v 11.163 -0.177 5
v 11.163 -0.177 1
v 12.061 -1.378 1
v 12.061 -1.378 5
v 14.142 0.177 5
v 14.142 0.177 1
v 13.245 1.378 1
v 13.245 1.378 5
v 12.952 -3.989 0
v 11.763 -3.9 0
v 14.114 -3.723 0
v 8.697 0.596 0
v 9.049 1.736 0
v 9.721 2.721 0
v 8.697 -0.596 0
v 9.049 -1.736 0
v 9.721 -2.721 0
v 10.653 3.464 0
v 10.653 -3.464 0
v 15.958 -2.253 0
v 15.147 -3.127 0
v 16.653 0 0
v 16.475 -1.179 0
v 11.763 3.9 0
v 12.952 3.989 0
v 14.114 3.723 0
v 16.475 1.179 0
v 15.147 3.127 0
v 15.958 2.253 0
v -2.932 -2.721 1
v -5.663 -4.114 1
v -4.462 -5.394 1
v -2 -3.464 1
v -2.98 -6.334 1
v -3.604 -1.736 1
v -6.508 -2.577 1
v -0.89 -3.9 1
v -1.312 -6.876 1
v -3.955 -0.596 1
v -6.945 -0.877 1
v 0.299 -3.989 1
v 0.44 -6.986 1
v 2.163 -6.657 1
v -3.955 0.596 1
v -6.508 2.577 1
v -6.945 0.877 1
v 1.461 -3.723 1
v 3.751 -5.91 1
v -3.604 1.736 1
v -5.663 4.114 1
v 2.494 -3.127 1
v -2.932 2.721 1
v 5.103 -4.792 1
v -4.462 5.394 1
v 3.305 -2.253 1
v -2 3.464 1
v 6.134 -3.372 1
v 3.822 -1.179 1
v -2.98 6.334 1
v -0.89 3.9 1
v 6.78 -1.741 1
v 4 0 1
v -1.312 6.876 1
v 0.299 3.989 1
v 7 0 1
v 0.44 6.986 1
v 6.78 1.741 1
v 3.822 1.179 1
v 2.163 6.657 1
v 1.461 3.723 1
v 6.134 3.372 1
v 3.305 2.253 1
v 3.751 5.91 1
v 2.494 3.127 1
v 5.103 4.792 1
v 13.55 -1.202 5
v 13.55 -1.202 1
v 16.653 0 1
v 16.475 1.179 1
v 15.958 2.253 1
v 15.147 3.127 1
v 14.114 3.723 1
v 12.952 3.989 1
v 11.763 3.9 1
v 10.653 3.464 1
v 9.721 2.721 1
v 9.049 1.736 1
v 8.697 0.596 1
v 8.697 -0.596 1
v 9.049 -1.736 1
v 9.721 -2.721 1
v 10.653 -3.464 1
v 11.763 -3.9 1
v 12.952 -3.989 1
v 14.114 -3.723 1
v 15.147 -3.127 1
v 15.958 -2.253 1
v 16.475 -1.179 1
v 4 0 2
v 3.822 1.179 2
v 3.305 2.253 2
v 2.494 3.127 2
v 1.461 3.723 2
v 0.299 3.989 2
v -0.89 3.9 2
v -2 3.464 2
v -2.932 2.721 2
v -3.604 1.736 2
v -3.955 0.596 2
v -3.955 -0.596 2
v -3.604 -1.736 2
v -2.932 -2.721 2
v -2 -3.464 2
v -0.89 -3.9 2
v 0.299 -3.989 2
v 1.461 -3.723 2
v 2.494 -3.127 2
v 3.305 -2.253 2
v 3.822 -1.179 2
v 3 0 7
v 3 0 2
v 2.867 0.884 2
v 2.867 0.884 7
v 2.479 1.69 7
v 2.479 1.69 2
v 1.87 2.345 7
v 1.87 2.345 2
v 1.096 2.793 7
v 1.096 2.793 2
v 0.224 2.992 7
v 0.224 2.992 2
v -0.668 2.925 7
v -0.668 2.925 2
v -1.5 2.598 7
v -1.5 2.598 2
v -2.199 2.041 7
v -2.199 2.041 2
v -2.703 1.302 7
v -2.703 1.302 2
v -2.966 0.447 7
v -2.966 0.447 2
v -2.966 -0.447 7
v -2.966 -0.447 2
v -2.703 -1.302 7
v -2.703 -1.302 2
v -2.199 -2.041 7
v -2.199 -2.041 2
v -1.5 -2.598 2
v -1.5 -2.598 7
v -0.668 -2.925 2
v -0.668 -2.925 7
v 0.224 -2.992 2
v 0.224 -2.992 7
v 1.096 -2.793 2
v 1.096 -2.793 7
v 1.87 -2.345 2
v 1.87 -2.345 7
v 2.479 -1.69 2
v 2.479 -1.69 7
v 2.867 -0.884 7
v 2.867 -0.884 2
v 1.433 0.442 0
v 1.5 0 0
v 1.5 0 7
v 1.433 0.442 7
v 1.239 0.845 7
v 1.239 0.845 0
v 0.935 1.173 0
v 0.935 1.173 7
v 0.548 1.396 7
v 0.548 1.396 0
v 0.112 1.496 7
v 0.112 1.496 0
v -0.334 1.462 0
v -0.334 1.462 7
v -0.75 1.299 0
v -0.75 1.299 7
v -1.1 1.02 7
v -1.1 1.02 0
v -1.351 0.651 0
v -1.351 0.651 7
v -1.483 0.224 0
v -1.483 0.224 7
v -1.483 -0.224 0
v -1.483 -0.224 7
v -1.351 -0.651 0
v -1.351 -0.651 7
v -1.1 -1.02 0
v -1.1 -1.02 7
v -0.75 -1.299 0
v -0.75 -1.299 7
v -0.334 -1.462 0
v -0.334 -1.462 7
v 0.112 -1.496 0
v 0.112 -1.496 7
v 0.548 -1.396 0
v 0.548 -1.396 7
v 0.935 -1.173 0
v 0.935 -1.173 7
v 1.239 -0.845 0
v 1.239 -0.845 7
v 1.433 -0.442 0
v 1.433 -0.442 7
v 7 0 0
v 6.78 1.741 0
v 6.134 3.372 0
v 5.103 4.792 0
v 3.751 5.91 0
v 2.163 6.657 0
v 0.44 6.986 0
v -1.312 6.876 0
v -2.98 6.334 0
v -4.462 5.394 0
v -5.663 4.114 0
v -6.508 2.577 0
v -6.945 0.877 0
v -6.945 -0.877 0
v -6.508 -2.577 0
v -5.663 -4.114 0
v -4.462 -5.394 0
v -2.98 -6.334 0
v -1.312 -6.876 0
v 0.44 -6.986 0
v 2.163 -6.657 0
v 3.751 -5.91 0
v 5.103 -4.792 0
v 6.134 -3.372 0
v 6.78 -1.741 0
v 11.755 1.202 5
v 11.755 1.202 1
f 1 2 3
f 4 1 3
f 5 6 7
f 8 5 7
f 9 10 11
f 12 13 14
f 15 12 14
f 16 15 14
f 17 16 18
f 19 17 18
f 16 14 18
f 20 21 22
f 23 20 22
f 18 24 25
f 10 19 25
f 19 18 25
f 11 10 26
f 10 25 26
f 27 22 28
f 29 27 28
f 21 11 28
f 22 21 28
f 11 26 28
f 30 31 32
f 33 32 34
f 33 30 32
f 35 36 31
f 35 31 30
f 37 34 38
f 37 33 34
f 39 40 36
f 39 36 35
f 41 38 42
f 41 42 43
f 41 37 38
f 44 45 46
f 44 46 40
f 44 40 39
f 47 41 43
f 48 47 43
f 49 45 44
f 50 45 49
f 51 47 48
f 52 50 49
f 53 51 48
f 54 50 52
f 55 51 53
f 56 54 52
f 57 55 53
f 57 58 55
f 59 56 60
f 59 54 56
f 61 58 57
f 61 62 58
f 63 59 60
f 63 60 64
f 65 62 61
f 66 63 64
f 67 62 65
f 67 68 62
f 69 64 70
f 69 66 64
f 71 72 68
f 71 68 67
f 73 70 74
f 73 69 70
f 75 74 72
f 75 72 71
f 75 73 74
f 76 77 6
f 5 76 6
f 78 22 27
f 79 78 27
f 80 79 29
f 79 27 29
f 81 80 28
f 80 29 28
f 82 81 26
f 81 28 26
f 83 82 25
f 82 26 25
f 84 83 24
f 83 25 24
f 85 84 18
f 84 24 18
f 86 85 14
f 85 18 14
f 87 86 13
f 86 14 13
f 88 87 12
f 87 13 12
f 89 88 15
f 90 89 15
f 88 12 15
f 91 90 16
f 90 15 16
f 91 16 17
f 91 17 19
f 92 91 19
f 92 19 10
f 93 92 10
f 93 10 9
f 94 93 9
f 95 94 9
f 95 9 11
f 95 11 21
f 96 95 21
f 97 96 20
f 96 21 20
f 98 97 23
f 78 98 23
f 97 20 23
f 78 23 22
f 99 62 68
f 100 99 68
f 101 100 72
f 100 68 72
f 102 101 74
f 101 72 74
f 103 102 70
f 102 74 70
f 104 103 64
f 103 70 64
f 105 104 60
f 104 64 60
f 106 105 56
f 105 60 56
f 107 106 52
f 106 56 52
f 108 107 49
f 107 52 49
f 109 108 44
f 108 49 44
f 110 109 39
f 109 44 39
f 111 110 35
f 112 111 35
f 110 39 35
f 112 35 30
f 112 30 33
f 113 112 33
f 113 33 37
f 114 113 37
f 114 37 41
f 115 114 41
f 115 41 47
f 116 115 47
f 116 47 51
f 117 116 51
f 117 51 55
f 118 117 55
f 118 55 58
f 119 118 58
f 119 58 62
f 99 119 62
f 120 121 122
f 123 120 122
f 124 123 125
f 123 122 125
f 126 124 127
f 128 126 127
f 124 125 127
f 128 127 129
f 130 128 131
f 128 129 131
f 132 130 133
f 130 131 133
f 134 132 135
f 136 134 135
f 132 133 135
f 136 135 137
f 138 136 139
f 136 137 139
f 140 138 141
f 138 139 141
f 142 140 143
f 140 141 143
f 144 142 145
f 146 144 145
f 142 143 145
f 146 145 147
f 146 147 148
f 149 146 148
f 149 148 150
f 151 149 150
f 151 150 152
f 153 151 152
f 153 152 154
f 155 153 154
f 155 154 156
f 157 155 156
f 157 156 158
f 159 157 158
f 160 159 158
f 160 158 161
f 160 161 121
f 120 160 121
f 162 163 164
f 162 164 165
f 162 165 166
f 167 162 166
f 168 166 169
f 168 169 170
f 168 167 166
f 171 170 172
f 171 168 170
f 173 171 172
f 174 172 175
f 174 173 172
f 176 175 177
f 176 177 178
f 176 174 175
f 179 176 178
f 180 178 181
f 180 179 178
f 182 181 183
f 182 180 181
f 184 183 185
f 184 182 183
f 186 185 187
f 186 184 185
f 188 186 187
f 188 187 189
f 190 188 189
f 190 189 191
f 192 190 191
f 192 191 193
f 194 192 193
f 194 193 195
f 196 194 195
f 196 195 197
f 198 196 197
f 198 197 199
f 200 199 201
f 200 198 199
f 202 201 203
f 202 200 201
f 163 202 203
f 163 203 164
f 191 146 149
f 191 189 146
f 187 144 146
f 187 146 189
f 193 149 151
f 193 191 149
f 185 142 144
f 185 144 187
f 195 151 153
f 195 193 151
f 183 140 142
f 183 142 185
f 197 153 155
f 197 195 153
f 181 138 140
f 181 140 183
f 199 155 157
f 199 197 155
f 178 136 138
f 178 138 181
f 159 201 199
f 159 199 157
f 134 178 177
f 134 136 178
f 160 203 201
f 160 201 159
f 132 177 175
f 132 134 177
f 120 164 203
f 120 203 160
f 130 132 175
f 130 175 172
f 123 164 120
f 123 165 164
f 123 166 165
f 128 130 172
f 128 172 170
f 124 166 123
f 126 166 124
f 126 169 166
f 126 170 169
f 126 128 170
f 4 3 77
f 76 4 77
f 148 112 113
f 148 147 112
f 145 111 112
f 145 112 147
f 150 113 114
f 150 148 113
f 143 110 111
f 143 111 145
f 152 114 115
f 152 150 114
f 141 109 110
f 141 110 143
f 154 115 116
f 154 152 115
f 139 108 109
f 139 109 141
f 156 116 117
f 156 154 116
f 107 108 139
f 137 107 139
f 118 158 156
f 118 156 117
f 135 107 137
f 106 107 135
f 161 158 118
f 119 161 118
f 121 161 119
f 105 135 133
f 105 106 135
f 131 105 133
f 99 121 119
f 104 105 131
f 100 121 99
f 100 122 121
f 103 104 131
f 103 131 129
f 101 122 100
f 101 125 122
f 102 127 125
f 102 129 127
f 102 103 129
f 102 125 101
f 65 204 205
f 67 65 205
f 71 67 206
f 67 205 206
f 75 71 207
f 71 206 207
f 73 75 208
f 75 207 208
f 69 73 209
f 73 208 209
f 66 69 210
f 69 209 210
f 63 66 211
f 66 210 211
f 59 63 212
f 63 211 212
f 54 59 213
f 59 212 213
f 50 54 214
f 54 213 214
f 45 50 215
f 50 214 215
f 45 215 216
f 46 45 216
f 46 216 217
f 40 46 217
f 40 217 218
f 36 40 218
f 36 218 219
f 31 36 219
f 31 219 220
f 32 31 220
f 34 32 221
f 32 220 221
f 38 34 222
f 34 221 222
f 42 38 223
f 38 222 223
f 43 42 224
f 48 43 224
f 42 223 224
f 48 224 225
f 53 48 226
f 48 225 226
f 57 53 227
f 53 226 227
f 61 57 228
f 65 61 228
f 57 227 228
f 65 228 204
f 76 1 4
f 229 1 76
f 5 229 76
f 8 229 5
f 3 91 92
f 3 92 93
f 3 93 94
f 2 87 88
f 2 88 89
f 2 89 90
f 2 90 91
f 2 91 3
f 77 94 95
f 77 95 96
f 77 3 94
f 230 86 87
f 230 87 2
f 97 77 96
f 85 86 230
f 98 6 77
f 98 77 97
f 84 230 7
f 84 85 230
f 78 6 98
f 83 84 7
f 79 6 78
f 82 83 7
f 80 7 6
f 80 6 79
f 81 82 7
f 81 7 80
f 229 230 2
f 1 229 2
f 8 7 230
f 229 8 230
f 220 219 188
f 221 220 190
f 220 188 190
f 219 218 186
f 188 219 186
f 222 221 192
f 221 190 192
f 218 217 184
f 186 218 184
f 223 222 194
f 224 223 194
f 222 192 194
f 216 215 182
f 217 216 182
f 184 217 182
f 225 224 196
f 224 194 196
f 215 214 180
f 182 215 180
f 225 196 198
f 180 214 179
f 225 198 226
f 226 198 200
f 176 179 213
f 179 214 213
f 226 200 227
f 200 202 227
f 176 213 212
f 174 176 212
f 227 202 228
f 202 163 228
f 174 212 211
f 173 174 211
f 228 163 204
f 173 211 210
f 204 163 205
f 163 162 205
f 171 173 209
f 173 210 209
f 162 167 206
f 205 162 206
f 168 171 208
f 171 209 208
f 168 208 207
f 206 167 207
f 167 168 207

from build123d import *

# Parameters (mm, degrees)
F0_R     = 7
F0_R_2   = 4
F1_DEPTH = 1
F0_R_3   = 3
F2_DEPTH = 2
F0_R_4   = 1.5
F3_DEPTH = 7
F4_R     = 4
F5_DEPTH = 1
F6_DEPTH = 5


with BuildPart() as f1:
    # F0 (on Top) → F1 (new body)
    with BuildSketch(Plane.XY):
        Circle(F0_R)
        Circle(F0_R_2, mode=Mode.SUBTRACT)
    extrude(amount=F1_DEPTH)

    # F0 (on Top) → F2 (join)
    with BuildSketch(Plane.XY):
        Circle(F0_R_2)
        Circle(F0_R_3, mode=Mode.SUBTRACT)
    extrude(amount=F2_DEPTH)

    # F0 (on Top) → F3 (join)
    with BuildSketch(Plane.XY):
        Circle(F0_R_3)
        Circle(F0_R_4, mode=Mode.SUBTRACT)
    extrude(amount=F3_DEPTH)


with BuildPart() as f5:
    # F4 (on Top) → F5 (new body)
    with BuildSketch(Plane.XY):
        with Locations((12.652777, 0)):
            Circle(F4_R)
        Polygon((14.142355, 0.176514), (13.550432, -1.201755), (12.060854, -1.37827), (11.163199, -0.176514), (11.755122, 1.201755), (13.2447, 1.37827), align=None, mode=Mode.SUBTRACT)
    extrude(amount=F5_DEPTH)

    # F4 (on Top) → F6 (join)
    with BuildSketch(Plane.XY):
        Polygon((12.060854, -1.37827), (13.550432, -1.201755), (14.142355, 0.176514), (13.2447, 1.37827), (11.755122, 1.201755), (11.163199, -0.176514), align=None)
    extrude(amount=F6_DEPTH)


solid = Compound([f1.part, f5.part])
